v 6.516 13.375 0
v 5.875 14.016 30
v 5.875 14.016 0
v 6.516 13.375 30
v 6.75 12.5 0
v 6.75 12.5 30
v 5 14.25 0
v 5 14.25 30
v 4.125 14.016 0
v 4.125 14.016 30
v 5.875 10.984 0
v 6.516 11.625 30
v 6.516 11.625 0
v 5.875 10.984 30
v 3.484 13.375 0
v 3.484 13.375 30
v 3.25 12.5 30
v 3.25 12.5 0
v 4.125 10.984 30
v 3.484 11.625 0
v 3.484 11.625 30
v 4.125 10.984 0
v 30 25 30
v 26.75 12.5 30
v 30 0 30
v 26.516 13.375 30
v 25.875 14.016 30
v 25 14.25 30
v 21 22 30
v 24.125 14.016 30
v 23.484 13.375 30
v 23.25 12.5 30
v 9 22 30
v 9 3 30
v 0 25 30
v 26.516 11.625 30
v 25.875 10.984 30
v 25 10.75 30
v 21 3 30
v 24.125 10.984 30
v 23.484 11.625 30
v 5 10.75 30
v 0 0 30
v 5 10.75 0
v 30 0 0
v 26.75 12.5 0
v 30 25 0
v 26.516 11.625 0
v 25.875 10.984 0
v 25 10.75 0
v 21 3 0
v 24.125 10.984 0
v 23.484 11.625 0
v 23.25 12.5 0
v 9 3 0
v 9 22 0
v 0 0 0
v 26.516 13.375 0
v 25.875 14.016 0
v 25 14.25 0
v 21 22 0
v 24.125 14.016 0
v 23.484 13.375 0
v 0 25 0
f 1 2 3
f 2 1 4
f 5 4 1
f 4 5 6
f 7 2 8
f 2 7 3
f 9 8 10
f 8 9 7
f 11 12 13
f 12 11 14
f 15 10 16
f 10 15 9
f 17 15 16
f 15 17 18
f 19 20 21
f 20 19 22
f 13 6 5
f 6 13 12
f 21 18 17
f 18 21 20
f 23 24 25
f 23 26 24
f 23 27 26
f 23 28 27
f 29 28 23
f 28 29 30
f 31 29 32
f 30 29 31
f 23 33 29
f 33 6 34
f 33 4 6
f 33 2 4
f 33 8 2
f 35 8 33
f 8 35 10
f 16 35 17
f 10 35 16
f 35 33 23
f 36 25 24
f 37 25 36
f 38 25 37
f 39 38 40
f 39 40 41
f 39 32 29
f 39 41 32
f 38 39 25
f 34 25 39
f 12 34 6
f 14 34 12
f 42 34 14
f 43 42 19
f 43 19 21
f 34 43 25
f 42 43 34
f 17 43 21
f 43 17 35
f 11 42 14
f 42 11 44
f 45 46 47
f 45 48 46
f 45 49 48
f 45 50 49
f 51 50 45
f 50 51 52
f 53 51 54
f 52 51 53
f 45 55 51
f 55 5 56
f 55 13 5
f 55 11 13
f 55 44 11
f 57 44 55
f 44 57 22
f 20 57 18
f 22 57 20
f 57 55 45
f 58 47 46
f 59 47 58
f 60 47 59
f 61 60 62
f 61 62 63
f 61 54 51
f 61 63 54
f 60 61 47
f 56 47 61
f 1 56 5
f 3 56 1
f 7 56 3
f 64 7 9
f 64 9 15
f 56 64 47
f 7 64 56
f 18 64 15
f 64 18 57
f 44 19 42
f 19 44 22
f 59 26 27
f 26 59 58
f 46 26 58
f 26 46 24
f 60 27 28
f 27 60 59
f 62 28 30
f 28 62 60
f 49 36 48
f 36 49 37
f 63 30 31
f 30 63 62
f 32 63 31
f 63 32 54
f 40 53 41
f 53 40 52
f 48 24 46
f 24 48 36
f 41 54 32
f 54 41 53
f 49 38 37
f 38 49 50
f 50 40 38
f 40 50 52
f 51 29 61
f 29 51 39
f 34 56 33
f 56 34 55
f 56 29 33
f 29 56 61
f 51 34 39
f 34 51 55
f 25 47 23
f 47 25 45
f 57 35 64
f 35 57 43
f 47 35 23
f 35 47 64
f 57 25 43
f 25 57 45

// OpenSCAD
ht=30;

difference()
{
    
    cube([30,25,ht]);
    
    union()
    {
        translate([5,25/2,0])
            cylinder(d=3.5,h=ht,$fn=12);
        translate([30-5,25/2,0])
            cylinder(d=3.5,h=ht,$fn=12);
        
        translate([9,3,0])
            cube([30-9*2,25-3*2,ht]);
        /*translate([3,3,0])
            cube([30-3*2,5,ht]);
        translate([3,25-5-3,0])
            cube([30-3*2,5,ht]);*/
    }
}
